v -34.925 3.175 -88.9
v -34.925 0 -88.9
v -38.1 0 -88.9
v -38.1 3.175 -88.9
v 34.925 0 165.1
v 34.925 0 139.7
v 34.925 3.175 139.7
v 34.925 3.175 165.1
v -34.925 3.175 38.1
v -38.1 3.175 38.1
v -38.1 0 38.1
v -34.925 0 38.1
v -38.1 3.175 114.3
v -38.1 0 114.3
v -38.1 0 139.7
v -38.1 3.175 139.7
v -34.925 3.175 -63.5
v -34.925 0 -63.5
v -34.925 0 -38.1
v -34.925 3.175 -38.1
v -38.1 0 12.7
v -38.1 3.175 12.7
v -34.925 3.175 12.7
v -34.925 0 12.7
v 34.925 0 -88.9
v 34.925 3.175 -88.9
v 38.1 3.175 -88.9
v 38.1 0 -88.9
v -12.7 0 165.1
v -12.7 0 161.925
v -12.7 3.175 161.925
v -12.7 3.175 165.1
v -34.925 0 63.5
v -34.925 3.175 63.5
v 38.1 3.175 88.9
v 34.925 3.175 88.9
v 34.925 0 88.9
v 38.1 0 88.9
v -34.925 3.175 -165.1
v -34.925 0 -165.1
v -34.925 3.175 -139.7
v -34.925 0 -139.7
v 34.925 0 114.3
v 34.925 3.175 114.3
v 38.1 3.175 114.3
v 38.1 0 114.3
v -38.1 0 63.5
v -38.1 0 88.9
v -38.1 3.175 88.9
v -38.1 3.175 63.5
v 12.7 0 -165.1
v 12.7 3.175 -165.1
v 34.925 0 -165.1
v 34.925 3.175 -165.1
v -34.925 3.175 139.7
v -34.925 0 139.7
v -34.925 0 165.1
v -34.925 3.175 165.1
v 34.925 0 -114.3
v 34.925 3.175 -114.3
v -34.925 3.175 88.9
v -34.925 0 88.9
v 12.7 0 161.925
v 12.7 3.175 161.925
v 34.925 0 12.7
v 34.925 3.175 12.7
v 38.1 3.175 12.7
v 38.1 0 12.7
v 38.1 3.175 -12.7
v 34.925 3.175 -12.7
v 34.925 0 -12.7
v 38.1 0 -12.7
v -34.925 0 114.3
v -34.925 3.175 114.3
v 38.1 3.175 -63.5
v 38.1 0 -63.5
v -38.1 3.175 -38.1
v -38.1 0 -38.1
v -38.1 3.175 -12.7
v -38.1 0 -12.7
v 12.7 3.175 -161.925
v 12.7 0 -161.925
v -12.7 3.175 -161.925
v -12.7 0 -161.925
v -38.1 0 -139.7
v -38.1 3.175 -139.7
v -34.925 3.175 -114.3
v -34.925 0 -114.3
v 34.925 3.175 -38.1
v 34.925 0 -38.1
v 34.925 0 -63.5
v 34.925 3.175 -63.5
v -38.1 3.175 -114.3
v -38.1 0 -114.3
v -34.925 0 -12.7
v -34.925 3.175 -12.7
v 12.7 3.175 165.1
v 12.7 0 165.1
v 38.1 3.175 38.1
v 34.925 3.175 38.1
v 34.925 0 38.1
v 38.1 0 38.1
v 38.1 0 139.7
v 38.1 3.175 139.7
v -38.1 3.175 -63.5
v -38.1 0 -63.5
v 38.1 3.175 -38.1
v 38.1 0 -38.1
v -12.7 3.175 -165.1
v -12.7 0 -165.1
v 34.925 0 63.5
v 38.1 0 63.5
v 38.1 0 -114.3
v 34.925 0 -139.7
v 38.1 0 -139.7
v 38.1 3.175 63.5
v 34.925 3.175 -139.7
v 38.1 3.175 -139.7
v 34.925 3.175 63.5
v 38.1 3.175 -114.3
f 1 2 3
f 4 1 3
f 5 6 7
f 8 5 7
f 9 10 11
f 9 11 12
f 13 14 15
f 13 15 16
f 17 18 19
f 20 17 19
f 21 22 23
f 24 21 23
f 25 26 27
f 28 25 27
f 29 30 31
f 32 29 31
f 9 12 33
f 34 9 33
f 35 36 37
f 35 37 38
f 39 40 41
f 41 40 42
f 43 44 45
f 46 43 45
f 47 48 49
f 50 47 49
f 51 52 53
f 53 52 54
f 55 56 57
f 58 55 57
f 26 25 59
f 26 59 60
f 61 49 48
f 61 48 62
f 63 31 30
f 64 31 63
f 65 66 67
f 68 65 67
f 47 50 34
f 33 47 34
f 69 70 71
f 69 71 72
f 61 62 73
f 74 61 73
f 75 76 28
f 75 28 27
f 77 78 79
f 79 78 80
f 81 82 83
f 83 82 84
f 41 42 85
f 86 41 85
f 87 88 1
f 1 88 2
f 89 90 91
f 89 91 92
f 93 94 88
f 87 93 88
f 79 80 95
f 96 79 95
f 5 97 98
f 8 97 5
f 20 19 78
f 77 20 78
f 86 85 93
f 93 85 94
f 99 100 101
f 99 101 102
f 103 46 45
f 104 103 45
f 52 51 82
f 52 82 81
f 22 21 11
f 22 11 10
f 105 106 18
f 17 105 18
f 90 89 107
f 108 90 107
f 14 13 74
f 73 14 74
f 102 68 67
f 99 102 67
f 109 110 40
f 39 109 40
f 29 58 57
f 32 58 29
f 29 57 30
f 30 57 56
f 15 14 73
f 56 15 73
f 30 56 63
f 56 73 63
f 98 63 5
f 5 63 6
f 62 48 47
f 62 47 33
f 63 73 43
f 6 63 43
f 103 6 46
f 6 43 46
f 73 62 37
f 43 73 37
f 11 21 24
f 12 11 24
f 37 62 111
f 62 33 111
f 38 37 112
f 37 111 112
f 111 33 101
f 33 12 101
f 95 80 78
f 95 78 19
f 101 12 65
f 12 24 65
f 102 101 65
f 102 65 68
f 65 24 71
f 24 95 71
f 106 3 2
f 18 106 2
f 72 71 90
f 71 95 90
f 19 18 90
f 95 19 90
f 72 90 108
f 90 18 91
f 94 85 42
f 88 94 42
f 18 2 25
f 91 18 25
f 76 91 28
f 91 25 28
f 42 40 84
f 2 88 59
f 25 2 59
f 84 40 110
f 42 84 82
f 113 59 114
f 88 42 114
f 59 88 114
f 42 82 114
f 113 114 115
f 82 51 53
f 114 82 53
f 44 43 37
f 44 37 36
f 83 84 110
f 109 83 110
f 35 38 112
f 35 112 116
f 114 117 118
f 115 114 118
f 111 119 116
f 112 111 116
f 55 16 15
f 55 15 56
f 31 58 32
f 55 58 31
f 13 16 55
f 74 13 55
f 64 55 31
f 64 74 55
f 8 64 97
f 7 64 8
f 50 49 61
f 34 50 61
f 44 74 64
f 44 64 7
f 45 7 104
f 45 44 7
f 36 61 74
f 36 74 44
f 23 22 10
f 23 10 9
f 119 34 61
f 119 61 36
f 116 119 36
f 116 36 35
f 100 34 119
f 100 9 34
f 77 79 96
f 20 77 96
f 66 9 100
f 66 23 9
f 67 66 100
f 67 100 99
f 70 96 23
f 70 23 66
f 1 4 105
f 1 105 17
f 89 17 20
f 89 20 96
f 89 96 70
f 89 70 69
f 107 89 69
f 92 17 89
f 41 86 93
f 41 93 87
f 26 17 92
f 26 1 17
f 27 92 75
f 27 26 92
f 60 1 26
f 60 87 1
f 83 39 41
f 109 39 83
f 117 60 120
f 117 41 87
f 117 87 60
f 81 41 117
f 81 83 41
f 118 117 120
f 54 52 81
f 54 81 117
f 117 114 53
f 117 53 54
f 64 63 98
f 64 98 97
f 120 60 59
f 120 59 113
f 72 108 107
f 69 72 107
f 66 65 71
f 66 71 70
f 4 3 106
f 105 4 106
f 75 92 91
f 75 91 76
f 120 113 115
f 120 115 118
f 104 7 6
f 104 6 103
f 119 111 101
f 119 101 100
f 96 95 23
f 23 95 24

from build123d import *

# Parameters (mm, degrees)
BOSS_EXTRUDE1_DEPTH = 3.175
MIRROR1_START       = -161.925
MIRROR1_OUTLINE_W   = 69.85
MIRROR1_OUTLINE_H   = 3.175
MIRROR1_DEPTH       = 323.85
MIRROR1_START_2     = -165.1
MIRROR1_2_OUTLINE_W = 22.225
MIRROR1_2_OUTLINE_H = 3.175
MIRROR1_2_DEPTH     = 330.2
MIRROR1_START_3     = 12.7
MIRROR1_3_OUTLINE_W = 3.175
MIRROR1_3_OUTLINE_H = 3.175
MIRROR1_3_DEPTH     = 25.4
MIRROR1_START_4     = 63.5
MIRROR1_4_OUTLINE_W = 3.175
MIRROR1_4_OUTLINE_H = 3.175
MIRROR1_4_DEPTH     = 25.4
MIRROR1_START_5     = 114.3
MIRROR1_5_OUTLINE_W = 3.175
MIRROR1_5_OUTLINE_H = 3.175
MIRROR1_5_DEPTH     = 25.4
MIRROR1_START_6     = -139.7
MIRROR1_6_OUTLINE_W = 3.175
MIRROR1_6_OUTLINE_H = 3.175
MIRROR1_6_DEPTH     = 25.4
MIRROR1_START_7     = -88.9
MIRROR1_7_OUTLINE_W = 3.175
MIRROR1_7_OUTLINE_H = 3.175
MIRROR1_7_DEPTH     = 25.4
MIRROR1_START_8     = -38.1
MIRROR1_8_OUTLINE_W = 3.175
MIRROR1_8_OUTLINE_H = 3.175
MIRROR1_8_DEPTH     = 25.4


# Read off the part's stored shape, not the designer's step: Mirror1
with BuildPart() as part:
    # Sketch1 → Boss-Extrude1 (new body)
    with BuildSketch(Plane(origin=(0, 0, 0), x_dir=(1, 0, 0), z_dir=(0, 1, 0))):
        Polygon((0, 0), (0, 161.925), (-12.7, 161.925), (-12.7, 165.1), (-34.925, 165.1), (-34.925, 139.7), (-38.1, 139.7), (-38.1, 114.3), (-34.925, 114.3), (-34.925, 88.9), (-38.1, 88.9), (-38.1, 63.5), (-34.925, 63.5), (-34.925, 38.1), (-38.1, 38.1), (-38.1, 12.7), (-34.925, 12.7), (-34.925, 0), align=None)
    extrude(amount=BOSS_EXTRUDE1_DEPTH)

    # Mirror1 outline → Mirror1 (add)
    with BuildSketch(Plane.XY.offset(MIRROR1_START)):
        with Locations((0, 1.5875)):
            Rectangle(MIRROR1_OUTLINE_W, MIRROR1_OUTLINE_H)
    extrude(amount=MIRROR1_DEPTH)

    # Mirror1 2 outline → Mirror1 2 (add)
    with BuildSketch(Plane.XY.offset(MIRROR1_START_2)):
        with Locations((-23.8125, 1.5875)):
            Rectangle(MIRROR1_2_OUTLINE_W, MIRROR1_2_OUTLINE_H)
        with Locations((23.8125, 1.5875)):
            Rectangle(MIRROR1_2_OUTLINE_W, MIRROR1_2_OUTLINE_H)
    extrude(amount=MIRROR1_2_DEPTH)

    # Mirror1 3 outline → Mirror1 3 (add)
    with BuildSketch(Plane.XY.offset(MIRROR1_START_3)):
        with Locations((-36.5125, 1.5875)):
            Rectangle(MIRROR1_3_OUTLINE_W, MIRROR1_3_OUTLINE_H)
        with Locations((36.5125, 1.5875)):
            Rectangle(MIRROR1_3_OUTLINE_W, MIRROR1_3_OUTLINE_H)
    extrude(amount=MIRROR1_3_DEPTH)

    # Mirror1 4 outline → Mirror1 4 (add)
    with BuildSketch(Plane.XY.offset(MIRROR1_START_4)):
        with Locations((-36.5125, 1.5875)):
            Rectangle(MIRROR1_4_OUTLINE_W, MIRROR1_4_OUTLINE_H)
        with Locations((36.5125, 1.5875)):
            Rectangle(MIRROR1_4_OUTLINE_W, MIRROR1_4_OUTLINE_H)
    extrude(amount=MIRROR1_4_DEPTH)

    # Mirror1 5 outline → Mirror1 5 (add)
    with BuildSketch(Plane.XY.offset(MIRROR1_START_5)):
        with Locations((-36.5125, 1.5875)):
            Rectangle(MIRROR1_5_OUTLINE_W, MIRROR1_5_OUTLINE_H)
        with Locations((36.5125, 1.5875)):
            Rectangle(MIRROR1_5_OUTLINE_W, MIRROR1_5_OUTLINE_H)
    extrude(amount=MIRROR1_5_DEPTH)

    # Mirror1 6 outline → Mirror1 6 (add)
    with BuildSketch(Plane.XY.offset(MIRROR1_START_6)):
        with Locations((36.5125, 1.5875)):
            Rectangle(MIRROR1_6_OUTLINE_W, MIRROR1_6_OUTLINE_H)
    extrude(amount=MIRROR1_6_DEPTH)

    # Mirror1 7 outline → Mirror1 7 (add)
    with BuildSketch(Plane.XY.offset(MIRROR1_START_7)):
        with Locations((36.5125, 1.5875)):
            Rectangle(MIRROR1_7_OUTLINE_W, MIRROR1_7_OUTLINE_H)
    extrude(amount=MIRROR1_7_DEPTH)

    # Mirror1 8 outline → Mirror1 8 (add)
    with BuildSketch(Plane.XY.offset(MIRROR1_START_8)):
        with Locations((36.5125, 1.5875)):
            Rectangle(MIRROR1_8_OUTLINE_W, MIRROR1_8_OUTLINE_H)
    extrude(amount=MIRROR1_8_DEPTH)


solid = part.part
